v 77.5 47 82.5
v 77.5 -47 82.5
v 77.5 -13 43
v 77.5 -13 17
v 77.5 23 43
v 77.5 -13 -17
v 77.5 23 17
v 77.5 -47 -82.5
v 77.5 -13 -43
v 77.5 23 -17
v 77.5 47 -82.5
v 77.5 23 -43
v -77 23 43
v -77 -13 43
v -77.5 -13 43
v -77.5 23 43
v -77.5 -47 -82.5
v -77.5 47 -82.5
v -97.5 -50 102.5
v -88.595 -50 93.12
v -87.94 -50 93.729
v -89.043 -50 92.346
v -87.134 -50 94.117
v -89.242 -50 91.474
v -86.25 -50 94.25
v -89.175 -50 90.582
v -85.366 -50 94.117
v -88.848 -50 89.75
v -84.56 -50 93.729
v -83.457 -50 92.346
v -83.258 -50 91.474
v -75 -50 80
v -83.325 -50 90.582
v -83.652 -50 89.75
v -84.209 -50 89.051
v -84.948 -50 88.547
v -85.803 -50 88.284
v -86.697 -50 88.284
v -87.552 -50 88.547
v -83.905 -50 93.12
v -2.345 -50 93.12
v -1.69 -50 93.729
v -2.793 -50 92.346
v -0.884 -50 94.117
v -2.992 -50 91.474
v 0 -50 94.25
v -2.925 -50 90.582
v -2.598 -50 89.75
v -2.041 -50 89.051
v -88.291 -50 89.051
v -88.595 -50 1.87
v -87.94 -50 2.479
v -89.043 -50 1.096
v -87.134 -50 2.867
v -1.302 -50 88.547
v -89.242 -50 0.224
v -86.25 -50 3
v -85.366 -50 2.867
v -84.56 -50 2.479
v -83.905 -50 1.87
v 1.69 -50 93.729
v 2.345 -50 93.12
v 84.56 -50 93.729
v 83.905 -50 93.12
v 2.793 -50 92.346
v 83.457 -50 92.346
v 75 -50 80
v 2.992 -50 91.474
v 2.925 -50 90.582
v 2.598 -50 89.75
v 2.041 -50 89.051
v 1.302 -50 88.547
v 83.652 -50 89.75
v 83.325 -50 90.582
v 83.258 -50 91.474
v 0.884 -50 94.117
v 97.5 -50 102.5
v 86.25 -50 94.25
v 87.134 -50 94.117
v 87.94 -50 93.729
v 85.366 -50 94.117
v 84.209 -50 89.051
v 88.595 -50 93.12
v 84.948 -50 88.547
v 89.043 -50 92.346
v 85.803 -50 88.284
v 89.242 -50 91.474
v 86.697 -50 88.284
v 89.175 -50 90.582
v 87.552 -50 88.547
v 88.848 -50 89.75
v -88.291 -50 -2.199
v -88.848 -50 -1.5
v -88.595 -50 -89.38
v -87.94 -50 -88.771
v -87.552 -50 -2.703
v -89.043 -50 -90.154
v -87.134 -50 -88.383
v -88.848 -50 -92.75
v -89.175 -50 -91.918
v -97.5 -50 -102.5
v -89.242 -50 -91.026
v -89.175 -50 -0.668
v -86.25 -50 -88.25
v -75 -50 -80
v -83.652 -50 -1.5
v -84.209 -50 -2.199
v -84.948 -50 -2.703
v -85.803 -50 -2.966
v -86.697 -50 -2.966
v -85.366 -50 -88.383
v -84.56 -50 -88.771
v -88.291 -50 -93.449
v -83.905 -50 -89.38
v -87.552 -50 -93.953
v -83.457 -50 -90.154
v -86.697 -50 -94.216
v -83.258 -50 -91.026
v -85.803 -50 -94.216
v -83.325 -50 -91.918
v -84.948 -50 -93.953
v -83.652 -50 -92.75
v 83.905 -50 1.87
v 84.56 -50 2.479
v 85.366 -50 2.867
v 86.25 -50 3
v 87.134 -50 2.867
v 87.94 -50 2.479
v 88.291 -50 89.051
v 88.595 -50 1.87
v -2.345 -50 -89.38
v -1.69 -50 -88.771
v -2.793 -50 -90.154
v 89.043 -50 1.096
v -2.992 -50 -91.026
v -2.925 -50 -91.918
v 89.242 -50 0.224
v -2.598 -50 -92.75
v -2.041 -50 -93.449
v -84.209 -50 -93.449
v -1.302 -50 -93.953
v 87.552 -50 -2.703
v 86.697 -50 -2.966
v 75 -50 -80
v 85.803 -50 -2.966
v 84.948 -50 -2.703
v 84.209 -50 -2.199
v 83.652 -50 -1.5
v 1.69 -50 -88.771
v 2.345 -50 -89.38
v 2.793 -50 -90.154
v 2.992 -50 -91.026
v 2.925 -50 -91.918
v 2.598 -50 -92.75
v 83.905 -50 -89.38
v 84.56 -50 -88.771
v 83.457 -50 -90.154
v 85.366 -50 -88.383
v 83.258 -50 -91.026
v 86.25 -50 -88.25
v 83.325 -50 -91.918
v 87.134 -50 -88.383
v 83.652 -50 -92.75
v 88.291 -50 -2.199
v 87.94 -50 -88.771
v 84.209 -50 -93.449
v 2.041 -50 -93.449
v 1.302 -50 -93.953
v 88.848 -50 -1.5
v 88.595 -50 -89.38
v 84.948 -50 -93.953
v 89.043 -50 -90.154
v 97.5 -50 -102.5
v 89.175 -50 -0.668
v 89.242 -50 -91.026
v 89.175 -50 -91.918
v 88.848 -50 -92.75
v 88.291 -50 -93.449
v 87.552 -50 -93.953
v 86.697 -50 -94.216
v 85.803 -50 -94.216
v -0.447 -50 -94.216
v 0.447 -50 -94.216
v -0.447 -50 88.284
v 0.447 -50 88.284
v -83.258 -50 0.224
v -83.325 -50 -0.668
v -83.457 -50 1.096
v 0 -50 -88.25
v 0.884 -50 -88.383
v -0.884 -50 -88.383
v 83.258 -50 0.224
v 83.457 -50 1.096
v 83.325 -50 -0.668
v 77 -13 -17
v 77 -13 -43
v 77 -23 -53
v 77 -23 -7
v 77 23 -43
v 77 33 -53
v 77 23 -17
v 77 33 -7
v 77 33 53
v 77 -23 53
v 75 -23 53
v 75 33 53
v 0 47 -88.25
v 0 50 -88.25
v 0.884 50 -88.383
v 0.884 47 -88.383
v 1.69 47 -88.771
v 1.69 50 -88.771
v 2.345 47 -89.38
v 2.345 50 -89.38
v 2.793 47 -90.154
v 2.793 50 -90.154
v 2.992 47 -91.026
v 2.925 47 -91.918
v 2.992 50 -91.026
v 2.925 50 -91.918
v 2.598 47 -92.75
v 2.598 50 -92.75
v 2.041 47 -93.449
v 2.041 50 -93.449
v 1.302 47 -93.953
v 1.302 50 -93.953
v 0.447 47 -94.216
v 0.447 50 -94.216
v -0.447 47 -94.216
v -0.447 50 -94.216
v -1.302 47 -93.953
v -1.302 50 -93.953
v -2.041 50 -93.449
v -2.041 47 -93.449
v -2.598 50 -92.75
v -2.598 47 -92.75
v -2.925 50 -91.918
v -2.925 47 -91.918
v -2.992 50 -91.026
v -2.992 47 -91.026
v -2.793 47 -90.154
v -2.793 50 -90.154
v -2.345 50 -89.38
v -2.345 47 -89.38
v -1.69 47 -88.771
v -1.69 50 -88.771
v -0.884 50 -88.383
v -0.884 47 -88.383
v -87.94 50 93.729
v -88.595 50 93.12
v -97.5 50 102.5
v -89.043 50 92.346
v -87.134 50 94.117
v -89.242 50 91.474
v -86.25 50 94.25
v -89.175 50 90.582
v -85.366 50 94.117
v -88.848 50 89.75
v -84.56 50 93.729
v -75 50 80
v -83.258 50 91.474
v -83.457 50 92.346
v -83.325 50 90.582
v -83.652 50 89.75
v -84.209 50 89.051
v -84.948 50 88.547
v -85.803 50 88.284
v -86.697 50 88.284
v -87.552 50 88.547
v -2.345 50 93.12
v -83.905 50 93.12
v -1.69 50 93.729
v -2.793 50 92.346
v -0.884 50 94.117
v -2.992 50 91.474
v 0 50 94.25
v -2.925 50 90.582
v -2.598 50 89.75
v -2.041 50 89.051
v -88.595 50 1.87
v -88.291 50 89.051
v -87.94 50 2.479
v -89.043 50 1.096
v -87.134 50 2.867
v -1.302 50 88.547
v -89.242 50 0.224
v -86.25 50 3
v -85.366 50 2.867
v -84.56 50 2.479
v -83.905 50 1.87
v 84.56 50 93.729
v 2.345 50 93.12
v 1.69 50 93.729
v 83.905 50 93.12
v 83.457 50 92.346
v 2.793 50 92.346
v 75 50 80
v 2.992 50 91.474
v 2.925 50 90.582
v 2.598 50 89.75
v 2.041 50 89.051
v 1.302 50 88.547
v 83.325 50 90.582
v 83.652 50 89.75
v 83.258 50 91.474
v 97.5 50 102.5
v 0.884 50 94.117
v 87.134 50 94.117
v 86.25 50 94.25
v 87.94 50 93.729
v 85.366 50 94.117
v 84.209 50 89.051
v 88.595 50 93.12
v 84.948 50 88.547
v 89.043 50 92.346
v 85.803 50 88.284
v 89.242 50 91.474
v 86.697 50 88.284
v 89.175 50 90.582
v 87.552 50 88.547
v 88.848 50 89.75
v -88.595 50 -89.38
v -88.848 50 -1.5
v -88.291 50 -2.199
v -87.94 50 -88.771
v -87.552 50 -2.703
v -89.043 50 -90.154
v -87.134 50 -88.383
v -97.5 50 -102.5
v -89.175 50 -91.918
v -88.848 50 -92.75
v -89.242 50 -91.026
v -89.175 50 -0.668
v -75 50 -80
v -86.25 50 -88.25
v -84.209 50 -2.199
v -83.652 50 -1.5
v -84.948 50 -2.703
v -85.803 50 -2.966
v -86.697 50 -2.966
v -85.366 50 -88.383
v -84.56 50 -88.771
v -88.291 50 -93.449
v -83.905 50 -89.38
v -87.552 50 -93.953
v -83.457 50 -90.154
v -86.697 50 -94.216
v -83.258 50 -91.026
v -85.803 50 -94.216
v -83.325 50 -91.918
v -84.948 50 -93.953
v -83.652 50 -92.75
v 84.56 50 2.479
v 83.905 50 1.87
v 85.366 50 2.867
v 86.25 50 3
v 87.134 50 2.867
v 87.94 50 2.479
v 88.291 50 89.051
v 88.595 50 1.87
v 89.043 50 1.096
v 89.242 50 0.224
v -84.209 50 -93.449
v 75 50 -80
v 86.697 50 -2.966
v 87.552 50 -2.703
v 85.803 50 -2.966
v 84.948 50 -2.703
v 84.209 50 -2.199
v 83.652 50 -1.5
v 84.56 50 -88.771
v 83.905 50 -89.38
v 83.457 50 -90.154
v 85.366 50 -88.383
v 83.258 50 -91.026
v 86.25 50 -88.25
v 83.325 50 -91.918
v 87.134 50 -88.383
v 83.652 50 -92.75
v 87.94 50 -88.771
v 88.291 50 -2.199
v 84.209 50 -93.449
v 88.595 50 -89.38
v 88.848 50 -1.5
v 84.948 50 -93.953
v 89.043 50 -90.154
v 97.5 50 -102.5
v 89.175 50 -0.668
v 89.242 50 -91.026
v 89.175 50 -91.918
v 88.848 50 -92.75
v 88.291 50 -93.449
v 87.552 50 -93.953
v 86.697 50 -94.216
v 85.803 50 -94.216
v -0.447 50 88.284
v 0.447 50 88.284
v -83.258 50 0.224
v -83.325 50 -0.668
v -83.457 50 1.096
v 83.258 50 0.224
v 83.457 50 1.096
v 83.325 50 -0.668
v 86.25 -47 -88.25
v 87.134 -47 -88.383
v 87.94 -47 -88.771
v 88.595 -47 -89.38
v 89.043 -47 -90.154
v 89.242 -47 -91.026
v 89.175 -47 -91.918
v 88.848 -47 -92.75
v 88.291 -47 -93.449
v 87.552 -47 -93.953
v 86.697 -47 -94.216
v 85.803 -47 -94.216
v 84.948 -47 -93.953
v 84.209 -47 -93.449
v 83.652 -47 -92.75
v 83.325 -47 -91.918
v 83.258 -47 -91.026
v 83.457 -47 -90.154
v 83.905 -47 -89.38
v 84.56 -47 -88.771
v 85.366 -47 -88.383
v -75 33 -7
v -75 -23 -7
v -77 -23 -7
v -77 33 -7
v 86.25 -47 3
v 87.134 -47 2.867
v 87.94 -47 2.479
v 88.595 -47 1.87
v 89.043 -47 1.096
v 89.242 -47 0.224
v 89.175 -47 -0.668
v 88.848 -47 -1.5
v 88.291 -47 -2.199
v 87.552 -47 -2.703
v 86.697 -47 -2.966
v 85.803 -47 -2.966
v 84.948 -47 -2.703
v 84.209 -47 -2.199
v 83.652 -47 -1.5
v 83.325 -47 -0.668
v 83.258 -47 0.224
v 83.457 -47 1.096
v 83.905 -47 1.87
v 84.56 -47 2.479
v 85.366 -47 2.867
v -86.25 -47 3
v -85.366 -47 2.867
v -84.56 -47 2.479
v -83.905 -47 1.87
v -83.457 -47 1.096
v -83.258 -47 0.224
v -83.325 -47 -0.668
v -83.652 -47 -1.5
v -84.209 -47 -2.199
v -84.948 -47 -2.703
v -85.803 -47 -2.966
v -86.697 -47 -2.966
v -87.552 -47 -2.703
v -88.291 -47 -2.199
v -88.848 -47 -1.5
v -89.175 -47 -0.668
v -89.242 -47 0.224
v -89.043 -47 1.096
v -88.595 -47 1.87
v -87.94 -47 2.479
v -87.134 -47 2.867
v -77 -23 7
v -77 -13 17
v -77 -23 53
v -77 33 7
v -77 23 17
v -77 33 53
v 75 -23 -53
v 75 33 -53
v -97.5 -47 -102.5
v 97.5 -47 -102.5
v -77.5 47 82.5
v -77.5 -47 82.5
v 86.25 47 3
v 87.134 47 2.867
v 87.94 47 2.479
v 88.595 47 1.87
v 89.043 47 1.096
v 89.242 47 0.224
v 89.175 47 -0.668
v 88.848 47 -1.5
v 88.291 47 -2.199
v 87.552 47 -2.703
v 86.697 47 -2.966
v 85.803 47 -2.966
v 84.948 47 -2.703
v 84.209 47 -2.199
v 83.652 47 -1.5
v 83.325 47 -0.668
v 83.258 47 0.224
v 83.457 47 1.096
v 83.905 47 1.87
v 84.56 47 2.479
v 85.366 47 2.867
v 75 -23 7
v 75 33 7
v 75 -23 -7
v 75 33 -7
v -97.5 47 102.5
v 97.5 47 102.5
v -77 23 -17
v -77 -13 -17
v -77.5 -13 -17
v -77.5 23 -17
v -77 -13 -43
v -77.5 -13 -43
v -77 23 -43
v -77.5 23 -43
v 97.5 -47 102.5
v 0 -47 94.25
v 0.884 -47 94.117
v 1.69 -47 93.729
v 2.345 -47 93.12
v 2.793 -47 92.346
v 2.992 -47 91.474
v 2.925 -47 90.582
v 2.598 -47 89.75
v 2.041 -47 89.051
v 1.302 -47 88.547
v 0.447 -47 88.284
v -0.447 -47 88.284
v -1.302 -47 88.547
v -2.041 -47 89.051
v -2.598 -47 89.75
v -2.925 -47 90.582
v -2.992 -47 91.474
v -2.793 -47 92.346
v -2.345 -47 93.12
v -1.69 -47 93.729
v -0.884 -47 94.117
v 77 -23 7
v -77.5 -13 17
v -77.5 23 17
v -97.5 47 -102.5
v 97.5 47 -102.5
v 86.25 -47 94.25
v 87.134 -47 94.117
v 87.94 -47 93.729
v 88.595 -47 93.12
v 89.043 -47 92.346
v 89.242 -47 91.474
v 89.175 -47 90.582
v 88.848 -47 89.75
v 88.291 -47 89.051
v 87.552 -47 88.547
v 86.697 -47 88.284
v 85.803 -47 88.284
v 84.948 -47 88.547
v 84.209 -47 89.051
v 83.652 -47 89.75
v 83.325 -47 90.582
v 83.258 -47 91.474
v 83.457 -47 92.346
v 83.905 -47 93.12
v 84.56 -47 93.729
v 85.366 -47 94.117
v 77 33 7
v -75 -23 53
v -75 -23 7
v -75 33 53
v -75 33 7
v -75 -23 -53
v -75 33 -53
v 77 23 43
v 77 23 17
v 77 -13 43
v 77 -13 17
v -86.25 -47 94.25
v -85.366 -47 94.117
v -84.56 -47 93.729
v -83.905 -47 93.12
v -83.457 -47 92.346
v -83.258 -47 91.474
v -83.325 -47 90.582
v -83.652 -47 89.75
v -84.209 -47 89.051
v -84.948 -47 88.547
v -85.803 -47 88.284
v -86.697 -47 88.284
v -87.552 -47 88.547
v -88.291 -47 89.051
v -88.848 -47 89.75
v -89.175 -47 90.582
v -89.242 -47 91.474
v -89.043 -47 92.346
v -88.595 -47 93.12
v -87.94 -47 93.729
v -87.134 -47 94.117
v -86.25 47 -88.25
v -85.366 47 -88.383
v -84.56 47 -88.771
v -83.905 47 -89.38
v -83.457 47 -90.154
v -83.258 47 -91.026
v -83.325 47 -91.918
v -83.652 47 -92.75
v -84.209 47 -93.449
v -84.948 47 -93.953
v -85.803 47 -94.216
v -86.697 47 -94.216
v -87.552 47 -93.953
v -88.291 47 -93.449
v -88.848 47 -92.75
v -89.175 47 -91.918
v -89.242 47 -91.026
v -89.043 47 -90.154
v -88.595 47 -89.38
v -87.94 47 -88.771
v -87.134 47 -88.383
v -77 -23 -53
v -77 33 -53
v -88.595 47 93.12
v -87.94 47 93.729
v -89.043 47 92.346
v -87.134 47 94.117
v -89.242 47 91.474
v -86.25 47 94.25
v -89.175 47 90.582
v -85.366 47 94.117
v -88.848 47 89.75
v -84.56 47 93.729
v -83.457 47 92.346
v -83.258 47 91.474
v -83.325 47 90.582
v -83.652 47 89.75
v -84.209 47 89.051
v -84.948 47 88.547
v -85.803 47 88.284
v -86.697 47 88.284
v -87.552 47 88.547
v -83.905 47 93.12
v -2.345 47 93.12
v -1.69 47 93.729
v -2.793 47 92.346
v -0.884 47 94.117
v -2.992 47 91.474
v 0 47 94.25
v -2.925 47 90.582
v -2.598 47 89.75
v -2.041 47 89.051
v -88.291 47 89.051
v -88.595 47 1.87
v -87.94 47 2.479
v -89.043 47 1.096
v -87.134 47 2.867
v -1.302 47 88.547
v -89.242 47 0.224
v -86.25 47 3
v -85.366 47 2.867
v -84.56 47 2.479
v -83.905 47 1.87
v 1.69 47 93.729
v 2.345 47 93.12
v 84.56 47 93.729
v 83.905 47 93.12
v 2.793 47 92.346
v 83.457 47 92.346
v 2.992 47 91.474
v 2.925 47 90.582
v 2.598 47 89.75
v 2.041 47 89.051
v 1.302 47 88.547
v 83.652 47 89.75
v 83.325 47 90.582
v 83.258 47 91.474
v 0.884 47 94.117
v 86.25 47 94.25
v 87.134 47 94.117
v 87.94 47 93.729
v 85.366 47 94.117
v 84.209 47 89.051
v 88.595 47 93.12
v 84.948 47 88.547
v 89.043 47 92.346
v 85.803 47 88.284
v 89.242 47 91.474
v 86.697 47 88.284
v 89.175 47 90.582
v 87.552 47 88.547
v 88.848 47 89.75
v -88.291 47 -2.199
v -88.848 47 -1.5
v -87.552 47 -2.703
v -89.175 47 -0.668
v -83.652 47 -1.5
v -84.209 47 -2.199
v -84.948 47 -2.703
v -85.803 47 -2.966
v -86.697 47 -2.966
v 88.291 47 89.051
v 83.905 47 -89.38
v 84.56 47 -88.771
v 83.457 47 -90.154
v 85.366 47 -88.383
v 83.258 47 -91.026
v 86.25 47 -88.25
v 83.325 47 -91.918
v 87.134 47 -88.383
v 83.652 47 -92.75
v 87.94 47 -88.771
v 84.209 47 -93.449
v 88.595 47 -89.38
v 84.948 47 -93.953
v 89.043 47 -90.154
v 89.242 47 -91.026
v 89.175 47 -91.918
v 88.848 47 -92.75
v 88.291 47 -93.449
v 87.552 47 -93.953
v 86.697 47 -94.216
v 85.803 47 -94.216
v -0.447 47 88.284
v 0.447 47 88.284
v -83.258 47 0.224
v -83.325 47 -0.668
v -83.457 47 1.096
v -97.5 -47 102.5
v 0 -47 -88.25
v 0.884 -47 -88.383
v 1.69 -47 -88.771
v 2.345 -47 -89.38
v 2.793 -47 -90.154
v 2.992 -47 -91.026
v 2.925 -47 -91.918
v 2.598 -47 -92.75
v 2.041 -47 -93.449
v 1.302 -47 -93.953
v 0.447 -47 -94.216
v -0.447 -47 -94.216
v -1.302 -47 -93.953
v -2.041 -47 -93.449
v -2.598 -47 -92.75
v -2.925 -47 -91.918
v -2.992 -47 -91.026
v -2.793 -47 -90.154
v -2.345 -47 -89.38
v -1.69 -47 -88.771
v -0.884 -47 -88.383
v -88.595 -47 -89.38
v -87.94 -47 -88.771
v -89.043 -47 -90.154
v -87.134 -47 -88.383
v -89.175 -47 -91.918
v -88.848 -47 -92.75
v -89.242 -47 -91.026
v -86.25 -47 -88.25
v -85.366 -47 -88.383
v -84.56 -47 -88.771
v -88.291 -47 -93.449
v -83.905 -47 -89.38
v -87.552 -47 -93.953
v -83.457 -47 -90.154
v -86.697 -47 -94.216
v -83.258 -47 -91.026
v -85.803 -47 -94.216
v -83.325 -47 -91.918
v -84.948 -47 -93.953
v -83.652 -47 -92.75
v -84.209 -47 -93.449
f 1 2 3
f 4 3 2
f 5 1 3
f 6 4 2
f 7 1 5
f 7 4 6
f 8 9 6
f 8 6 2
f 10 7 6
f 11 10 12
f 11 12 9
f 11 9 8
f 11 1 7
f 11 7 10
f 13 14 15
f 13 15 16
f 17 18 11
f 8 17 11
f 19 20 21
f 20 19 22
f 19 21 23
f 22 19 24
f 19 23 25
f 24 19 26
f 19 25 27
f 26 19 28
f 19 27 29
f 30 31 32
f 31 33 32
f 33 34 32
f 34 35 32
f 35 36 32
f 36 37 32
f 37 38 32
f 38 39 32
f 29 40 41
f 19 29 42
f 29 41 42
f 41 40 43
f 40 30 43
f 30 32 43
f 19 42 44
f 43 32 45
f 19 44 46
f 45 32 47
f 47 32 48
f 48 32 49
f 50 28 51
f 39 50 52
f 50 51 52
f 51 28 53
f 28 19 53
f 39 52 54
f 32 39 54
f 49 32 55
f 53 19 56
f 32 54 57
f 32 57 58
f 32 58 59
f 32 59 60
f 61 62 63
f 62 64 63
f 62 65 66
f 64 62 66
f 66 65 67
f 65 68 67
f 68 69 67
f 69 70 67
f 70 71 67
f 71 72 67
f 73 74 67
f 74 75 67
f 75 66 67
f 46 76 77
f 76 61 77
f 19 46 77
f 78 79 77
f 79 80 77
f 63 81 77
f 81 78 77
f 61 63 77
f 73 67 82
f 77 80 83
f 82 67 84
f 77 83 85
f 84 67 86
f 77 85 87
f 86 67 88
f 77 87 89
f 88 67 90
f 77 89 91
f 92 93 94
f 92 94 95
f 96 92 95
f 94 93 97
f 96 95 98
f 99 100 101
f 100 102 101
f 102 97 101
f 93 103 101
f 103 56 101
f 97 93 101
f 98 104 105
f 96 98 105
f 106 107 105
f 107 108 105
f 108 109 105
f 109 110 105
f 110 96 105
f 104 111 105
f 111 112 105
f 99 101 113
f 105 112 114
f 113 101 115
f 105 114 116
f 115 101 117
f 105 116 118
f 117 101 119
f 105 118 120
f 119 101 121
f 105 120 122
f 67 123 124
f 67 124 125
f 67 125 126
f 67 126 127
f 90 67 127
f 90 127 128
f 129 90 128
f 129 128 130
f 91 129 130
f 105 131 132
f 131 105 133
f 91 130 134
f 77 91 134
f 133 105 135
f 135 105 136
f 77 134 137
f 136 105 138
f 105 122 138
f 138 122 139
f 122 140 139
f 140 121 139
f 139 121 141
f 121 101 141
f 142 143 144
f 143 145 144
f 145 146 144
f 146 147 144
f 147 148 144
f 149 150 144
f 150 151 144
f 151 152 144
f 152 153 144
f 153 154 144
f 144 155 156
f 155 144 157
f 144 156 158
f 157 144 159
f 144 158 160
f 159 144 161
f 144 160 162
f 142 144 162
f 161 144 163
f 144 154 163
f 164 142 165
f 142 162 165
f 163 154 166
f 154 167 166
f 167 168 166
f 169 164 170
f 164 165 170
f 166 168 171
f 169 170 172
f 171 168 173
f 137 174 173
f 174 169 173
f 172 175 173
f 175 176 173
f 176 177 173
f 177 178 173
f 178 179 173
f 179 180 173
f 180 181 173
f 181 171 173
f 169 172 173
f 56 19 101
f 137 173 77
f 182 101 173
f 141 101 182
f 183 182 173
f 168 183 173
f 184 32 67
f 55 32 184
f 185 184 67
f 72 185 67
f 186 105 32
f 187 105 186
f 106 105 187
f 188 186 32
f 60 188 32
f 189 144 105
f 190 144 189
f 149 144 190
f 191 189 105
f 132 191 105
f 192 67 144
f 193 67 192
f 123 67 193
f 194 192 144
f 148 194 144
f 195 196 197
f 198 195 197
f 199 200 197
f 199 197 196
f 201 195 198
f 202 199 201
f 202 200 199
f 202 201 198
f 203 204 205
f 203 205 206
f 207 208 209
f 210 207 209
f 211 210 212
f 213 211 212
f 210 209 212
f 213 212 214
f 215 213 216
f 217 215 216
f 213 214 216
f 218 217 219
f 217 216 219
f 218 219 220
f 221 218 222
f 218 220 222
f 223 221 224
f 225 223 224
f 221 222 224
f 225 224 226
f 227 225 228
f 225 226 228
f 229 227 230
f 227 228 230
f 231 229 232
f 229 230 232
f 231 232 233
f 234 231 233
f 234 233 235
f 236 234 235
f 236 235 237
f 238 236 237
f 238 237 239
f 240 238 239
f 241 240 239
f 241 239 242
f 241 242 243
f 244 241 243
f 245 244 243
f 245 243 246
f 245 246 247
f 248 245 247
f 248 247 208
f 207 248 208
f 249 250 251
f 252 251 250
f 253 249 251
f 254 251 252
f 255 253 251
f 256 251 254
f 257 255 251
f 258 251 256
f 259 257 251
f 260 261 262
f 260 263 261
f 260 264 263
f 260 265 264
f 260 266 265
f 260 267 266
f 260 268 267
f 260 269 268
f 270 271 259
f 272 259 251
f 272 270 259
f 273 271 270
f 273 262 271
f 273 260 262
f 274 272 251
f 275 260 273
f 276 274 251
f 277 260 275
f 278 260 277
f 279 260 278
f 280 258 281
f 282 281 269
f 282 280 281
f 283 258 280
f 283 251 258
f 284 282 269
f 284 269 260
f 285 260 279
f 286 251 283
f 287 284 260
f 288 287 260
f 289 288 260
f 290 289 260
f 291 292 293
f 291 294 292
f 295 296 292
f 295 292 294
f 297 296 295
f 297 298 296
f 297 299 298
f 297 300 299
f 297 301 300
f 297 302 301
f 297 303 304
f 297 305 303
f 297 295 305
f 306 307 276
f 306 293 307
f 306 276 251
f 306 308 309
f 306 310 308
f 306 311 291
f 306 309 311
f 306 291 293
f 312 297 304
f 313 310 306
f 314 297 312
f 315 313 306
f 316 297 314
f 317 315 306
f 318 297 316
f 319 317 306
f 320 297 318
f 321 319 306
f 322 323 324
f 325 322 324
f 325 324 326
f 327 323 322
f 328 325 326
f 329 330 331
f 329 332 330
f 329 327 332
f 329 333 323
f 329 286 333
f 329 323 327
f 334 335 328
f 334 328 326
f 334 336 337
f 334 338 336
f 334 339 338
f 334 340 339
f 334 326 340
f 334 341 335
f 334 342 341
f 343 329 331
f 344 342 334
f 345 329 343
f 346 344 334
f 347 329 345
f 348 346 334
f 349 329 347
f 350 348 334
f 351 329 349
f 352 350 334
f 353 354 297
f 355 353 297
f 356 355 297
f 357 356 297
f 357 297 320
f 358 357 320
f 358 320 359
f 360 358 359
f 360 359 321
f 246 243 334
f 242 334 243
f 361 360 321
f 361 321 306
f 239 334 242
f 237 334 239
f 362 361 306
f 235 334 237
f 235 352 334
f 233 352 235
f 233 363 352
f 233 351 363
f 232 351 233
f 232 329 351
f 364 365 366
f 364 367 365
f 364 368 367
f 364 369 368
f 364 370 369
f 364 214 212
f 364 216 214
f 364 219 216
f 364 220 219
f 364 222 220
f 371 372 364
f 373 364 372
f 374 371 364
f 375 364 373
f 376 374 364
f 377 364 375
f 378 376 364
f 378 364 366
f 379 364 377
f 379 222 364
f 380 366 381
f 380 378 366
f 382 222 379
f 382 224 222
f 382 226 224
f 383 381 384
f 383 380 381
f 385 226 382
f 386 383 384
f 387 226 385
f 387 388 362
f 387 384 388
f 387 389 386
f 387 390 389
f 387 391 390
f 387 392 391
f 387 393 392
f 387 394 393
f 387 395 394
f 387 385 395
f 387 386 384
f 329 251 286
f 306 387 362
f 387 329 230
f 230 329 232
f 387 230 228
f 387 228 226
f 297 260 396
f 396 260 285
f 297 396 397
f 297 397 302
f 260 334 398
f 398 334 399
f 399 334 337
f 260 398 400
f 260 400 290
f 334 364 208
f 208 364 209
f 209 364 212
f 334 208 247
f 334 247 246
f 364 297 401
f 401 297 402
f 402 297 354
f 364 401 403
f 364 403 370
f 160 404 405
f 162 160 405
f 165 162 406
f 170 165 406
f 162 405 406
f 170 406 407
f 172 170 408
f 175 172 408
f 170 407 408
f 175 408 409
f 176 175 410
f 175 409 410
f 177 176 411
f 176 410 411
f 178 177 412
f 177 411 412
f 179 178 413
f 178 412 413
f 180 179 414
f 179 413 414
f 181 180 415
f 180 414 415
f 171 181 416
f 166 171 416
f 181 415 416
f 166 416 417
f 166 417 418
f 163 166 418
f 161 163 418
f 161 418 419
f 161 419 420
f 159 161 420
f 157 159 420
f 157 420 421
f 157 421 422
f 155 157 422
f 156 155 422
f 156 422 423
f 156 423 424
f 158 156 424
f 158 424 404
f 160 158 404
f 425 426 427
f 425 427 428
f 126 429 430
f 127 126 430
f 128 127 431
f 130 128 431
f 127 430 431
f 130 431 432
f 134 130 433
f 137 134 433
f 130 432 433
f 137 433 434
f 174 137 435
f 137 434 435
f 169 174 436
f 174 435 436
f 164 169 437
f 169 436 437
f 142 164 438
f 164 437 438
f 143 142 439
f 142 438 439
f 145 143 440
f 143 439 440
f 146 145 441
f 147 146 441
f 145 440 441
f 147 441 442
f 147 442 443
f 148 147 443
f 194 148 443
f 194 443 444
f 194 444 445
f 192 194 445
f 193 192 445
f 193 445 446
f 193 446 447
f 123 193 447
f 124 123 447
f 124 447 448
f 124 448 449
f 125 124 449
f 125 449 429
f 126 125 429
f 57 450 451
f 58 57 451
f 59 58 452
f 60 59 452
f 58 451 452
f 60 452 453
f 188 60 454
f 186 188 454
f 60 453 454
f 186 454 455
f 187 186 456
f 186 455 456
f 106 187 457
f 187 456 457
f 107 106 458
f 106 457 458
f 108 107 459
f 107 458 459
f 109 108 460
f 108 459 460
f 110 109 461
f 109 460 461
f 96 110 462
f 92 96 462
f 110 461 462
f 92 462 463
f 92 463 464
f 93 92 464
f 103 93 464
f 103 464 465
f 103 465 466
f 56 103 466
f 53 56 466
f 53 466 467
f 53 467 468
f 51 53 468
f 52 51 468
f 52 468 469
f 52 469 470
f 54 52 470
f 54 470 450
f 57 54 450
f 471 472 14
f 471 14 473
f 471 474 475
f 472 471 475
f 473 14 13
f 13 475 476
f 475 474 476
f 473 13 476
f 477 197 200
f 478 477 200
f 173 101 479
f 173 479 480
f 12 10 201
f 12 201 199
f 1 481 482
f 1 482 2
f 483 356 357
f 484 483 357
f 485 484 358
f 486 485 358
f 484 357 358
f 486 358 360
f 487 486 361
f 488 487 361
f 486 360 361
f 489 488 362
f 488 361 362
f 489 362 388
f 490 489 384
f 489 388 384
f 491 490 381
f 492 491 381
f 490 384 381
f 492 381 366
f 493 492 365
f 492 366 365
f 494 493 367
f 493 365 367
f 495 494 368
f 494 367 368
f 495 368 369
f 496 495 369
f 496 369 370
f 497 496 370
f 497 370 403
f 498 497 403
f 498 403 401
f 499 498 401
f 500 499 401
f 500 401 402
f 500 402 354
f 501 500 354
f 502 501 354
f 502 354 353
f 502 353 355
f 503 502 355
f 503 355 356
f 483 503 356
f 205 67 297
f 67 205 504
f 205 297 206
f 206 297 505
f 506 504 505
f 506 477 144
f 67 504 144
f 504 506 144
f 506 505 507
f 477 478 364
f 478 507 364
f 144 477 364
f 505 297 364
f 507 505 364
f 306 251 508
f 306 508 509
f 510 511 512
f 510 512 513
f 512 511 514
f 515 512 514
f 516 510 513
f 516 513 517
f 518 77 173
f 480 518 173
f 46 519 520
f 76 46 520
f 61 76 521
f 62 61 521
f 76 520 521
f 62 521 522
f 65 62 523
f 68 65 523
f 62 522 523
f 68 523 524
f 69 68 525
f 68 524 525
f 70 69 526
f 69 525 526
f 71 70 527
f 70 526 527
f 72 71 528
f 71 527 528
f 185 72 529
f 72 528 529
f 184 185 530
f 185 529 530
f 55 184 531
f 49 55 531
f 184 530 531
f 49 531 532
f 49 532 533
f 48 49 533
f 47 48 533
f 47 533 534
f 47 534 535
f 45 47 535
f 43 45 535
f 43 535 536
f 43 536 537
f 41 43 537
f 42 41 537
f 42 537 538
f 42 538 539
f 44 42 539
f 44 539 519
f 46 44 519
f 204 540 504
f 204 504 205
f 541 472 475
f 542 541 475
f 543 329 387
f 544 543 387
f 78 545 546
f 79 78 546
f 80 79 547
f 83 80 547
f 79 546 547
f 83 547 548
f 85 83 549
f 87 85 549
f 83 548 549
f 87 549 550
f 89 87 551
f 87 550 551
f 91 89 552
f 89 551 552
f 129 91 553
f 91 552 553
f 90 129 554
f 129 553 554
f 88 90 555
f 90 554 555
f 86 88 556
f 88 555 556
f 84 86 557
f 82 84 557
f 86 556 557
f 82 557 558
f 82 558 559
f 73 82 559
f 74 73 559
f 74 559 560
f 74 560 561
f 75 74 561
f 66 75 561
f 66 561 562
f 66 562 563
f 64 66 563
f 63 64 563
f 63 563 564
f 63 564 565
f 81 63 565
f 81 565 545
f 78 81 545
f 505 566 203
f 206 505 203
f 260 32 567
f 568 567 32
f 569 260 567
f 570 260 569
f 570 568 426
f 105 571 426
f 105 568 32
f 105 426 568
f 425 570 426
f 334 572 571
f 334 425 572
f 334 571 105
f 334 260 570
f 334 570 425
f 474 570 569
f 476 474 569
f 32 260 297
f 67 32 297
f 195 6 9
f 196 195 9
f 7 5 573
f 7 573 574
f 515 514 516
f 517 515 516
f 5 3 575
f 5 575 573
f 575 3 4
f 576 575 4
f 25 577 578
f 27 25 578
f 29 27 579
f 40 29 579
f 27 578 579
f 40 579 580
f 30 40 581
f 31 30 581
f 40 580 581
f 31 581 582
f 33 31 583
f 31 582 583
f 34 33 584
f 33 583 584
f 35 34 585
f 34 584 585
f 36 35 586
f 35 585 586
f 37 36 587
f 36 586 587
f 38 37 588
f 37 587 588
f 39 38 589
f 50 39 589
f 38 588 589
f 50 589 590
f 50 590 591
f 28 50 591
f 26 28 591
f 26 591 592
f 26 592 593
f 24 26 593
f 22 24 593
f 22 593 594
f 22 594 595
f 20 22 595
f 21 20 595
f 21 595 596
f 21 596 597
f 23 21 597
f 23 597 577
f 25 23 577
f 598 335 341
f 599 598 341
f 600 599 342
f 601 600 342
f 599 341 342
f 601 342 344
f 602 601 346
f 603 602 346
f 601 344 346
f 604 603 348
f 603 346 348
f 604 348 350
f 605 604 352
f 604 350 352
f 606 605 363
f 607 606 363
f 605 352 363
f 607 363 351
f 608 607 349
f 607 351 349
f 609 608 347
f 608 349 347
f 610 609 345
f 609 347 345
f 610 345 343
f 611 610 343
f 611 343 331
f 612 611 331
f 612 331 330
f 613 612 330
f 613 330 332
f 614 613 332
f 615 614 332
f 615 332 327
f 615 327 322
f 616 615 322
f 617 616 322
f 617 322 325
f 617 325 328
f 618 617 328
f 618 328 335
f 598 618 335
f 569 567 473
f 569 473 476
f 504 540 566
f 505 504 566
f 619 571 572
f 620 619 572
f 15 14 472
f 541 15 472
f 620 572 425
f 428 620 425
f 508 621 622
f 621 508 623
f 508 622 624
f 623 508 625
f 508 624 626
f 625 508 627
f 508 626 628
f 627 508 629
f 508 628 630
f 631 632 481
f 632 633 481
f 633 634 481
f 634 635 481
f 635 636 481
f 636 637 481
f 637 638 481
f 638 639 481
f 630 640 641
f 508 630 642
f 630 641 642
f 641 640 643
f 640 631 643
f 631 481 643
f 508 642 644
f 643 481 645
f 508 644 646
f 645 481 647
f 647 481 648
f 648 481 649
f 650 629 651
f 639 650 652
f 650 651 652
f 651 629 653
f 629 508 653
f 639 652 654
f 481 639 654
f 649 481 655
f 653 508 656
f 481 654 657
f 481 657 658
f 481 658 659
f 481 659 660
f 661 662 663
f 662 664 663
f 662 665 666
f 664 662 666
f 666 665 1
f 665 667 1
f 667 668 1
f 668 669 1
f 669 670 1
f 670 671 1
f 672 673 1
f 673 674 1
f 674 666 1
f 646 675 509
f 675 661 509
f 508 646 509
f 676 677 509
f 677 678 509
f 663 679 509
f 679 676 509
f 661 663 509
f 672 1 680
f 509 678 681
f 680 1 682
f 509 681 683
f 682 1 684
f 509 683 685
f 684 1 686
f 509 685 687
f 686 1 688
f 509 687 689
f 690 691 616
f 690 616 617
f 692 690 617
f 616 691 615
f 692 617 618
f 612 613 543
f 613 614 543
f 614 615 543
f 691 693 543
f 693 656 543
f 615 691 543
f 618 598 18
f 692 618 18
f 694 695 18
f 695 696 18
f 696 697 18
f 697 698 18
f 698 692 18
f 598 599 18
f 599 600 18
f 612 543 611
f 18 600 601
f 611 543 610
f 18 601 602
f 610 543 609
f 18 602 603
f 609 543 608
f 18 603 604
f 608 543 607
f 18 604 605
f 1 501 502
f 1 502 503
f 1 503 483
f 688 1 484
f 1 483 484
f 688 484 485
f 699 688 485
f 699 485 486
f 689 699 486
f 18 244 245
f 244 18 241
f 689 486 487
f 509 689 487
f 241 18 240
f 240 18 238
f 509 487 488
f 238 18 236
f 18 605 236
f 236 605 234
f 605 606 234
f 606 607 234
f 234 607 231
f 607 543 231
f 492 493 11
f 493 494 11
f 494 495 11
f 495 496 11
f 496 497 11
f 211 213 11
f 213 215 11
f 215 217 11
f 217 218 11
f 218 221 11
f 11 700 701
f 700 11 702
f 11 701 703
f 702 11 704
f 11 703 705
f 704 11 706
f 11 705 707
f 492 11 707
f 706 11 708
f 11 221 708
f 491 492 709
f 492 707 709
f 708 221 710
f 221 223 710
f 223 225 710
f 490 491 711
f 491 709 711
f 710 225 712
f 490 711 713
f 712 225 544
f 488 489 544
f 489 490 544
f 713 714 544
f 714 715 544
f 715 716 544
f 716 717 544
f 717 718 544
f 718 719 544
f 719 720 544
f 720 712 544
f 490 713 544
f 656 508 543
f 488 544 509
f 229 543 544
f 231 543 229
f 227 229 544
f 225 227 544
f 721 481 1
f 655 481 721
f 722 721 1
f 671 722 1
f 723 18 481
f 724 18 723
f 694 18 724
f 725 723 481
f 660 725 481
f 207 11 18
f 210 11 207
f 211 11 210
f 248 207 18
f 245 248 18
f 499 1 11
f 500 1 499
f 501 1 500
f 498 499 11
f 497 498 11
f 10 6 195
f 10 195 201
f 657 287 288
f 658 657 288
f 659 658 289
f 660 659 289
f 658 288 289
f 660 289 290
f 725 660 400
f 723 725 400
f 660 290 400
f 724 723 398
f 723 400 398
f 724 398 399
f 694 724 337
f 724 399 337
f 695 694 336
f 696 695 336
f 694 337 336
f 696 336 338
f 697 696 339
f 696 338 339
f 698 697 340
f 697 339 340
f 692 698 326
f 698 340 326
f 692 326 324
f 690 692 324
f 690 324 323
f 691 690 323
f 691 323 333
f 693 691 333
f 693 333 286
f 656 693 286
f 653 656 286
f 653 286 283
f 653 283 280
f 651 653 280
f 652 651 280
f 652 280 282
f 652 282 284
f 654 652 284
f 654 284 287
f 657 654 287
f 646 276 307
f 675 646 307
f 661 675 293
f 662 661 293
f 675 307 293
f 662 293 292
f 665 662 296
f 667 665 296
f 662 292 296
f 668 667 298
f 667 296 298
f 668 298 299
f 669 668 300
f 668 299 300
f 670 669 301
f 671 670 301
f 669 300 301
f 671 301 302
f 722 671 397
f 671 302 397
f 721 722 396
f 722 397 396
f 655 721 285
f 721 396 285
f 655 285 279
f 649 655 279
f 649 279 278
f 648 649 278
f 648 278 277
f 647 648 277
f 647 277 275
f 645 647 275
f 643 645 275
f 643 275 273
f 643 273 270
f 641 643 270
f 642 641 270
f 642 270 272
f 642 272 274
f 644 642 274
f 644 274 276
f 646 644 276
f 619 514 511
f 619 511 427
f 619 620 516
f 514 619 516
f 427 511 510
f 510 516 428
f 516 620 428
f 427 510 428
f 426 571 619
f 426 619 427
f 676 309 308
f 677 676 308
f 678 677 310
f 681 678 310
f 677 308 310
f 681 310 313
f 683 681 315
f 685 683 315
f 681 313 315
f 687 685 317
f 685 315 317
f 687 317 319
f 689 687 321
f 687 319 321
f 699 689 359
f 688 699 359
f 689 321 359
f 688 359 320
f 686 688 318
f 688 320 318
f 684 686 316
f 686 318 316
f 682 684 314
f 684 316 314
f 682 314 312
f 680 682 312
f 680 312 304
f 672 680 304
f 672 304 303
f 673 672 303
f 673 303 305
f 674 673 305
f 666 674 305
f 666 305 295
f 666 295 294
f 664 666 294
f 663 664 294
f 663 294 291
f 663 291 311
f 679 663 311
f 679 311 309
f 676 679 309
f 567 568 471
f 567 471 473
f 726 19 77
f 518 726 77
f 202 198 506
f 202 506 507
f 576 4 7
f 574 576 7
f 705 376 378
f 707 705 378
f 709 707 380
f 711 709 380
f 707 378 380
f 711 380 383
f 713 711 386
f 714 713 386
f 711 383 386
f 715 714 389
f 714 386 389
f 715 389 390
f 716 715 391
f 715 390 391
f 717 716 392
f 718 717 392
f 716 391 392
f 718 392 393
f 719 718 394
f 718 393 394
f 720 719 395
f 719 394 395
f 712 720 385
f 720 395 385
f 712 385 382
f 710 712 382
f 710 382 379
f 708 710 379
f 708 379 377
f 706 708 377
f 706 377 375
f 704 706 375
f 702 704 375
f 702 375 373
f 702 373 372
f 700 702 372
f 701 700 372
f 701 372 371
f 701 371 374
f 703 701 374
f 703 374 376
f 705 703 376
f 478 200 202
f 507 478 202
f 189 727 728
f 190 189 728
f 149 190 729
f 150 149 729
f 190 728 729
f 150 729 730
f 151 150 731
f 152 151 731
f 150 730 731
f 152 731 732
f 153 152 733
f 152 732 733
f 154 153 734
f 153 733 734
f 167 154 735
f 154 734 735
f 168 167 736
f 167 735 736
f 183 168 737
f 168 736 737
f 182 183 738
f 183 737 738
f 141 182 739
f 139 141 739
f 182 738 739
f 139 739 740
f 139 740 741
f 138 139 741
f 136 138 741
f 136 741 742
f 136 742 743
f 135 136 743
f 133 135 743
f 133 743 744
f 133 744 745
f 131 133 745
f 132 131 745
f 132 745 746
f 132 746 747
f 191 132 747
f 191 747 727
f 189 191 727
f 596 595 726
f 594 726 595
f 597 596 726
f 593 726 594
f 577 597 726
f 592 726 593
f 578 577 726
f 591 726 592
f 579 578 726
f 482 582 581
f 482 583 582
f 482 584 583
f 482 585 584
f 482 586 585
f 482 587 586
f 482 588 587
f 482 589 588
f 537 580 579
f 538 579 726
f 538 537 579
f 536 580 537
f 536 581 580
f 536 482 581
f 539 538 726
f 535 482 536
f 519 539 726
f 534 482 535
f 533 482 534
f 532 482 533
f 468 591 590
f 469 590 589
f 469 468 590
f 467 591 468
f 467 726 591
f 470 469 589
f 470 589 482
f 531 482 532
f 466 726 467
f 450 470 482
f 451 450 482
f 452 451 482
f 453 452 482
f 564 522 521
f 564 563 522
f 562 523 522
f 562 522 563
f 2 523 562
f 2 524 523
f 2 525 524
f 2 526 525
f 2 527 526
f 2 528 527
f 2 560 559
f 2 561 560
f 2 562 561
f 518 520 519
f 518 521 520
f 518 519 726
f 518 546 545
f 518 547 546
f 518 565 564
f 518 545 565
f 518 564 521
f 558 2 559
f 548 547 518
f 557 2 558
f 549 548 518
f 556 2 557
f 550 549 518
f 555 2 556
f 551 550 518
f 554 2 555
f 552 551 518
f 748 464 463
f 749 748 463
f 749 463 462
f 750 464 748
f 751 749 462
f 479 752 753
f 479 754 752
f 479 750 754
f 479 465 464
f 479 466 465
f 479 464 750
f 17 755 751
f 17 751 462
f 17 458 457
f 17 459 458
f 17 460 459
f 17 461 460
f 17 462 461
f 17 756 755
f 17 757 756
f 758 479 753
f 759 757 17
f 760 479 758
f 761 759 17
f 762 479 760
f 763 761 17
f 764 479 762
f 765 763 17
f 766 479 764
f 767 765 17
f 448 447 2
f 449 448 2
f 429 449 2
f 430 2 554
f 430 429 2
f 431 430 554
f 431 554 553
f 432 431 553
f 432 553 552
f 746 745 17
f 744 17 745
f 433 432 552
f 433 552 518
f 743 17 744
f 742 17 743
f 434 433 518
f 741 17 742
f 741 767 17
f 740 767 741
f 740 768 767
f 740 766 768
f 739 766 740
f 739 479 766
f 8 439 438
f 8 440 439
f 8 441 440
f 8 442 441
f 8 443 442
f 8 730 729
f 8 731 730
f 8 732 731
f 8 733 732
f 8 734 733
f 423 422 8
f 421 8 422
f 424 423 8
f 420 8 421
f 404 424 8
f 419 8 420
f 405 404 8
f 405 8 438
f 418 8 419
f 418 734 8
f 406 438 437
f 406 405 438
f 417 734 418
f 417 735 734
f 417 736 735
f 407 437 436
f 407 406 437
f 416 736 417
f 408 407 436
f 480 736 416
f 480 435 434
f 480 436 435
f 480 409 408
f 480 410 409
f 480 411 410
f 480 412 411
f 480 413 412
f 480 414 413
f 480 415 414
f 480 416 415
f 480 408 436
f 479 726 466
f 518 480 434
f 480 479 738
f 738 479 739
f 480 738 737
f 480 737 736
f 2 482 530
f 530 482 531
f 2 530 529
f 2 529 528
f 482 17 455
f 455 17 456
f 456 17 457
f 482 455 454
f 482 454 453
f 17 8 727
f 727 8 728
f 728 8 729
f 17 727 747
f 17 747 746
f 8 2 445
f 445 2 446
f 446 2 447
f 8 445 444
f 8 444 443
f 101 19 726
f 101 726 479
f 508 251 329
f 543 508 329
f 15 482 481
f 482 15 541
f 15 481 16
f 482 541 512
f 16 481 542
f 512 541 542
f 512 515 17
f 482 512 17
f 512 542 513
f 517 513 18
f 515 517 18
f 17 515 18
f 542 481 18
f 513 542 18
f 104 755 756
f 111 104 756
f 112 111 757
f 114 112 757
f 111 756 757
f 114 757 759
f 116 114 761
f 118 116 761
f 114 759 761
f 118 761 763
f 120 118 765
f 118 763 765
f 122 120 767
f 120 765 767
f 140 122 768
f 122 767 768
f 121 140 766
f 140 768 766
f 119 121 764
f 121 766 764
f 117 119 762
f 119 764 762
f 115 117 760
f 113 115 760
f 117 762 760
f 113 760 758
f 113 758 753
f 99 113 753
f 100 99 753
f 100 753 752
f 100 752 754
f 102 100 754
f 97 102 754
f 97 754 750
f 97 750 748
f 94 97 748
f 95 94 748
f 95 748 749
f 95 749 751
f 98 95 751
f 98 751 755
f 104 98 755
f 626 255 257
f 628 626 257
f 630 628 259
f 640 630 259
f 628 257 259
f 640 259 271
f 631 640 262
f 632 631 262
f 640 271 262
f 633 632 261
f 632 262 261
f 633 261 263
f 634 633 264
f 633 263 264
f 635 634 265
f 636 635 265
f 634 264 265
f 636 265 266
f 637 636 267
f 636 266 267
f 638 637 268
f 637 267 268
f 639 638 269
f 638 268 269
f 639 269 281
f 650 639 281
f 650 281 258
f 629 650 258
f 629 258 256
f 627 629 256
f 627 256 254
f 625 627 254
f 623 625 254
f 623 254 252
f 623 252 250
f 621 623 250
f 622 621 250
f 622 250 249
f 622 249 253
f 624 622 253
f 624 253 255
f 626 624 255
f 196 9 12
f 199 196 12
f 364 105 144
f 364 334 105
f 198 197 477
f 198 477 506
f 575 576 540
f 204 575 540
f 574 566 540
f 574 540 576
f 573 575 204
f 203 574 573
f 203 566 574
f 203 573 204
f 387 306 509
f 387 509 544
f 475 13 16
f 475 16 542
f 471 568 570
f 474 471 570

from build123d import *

# Parameters (mm, degrees)
SKETCH1_W           = 155
SKETCH1_H           = 165
SKETCH1_W_2         = 150
SKETCH1_H_2         = 160
BOSS_EXTRUDE1_DEPTH = 50
SKETCH2_W           = 26
SKETCH2_H           = 36
CUT_EXTRUDE1_DEPTH  = 183.568480303
CUT_EXTRUDE2_START  = -2
SKETCH3_W           = 46
SKETCH3_H           = 56
CUT_EXTRUDE2_DEPTH  = 154
SKETCH4_W           = 195
SKETCH4_H           = 205
SKETCH4_W_2         = 155
SKETCH4_H_2         = 165
BOSS_EXTRUDE2_DEPTH = 3
BOSS_EXTRUDE3_START = -100
SKETCH4_2_W         = 195
SKETCH4_2_H         = 205
SKETCH4_2_W_2       = 155
SKETCH4_2_H_2       = 165
BOSS_EXTRUDE3_DEPTH = 3
SKETCH5_R           = 3
CUT_EXTRUDE3_DEPTH  = 174.241161391


with BuildPart() as part:
    # Sketch1 → Boss-Extrude1 (new, symmetric)
    with BuildSketch(Plane(origin=(0, 0, 0), x_dir=(1, 0, 0), z_dir=(0, 1, 0))):
        Rectangle(SKETCH1_W, SKETCH1_H)
        Rectangle(SKETCH1_W_2, SKETCH1_H_2, mode=Mode.SUBTRACT)
    extrude(amount=BOSS_EXTRUDE1_DEPTH, both=True)

    # Sketch2 → Cut-Extrude1 (cut, through all)
    with BuildSketch(Plane(origin=(77.5, 0, 0), x_dir=(0, 0, -1), z_dir=(1, 0, 0))):
        with Locations((-30, 5)):
            Rectangle(SKETCH2_W, SKETCH2_H)
        with Locations((30, 5)):
            Rectangle(SKETCH2_W, SKETCH2_H)
    extrude(amount=-CUT_EXTRUDE1_DEPTH, mode=Mode.SUBTRACT)

    # Sketch3 → Cut-Extrude2 (cut)
    with BuildSketch(Plane.ZY.offset(-75).offset(CUT_EXTRUDE2_START)):
        with Locations((-30, 5)):
            Rectangle(SKETCH3_W, SKETCH3_H)
        with Locations((30, 5)):
            Rectangle(SKETCH3_W, SKETCH3_H)
    extrude(amount=CUT_EXTRUDE2_DEPTH, mode=Mode.SUBTRACT)

    # Sketch4 → Boss-Extrude2 (add)
    with BuildSketch(Plane(origin=(0, 50, 0), x_dir=(1, 0, 0), z_dir=(0, 1, 0))):
        Rectangle(SKETCH4_W, SKETCH4_H)
        Rectangle(SKETCH4_W_2, SKETCH4_H_2, mode=Mode.SUBTRACT)
    extrude(amount=-BOSS_EXTRUDE2_DEPTH)

    # Sketch4<2> → Boss-Extrude3 (add)
    with BuildSketch(Plane(origin=(0, 50, 0), x_dir=(1, 0, 0), z_dir=(0, 1, 0)).offset(BOSS_EXTRUDE3_START)):
        Rectangle(SKETCH4_2_W, SKETCH4_2_H)
        Rectangle(SKETCH4_2_W_2, SKETCH4_2_H_2, mode=Mode.SUBTRACT)
    extrude(amount=BOSS_EXTRUDE3_DEPTH)

    # Sketch5 → Cut-Extrude3 (cut, through all)
    with BuildSketch(Plane(origin=(0, 50, 0), x_dir=(1, 0, 0), z_dir=(0, 1, 0))):
        with Locations(Location((-86.25, 91.25, 0), (0, 0, 270))):
            Circle(SKETCH5_R)
        with Locations(Location((0, 91.25, 0), (0, 0, 270))):
            Circle(SKETCH5_R)
        with Locations(Location((86.25, 91.25, 0), (0, 0, 270))):
            Circle(SKETCH5_R)
        with Locations(Location((-86.25, 0, 0), (0, 0, 270))):
            Circle(SKETCH5_R)
        with Locations(Location((86.25, 0, 0), (0, 0, 270))):
            Circle(SKETCH5_R)
        with Locations(Location((86.25, -91.25, 0), (0, 0, 270))):
            Circle(SKETCH5_R)
        with Locations(Location((0, -91.25, 0), (0, 0, 270))):
            Circle(SKETCH5_R)
        with Locations(Location((-86.25, -91.25, 0), (0, 0, 270))):
            Circle(SKETCH5_R)
    extrude(amount=-CUT_EXTRUDE3_DEPTH, mode=Mode.SUBTRACT)


solid = part.part
